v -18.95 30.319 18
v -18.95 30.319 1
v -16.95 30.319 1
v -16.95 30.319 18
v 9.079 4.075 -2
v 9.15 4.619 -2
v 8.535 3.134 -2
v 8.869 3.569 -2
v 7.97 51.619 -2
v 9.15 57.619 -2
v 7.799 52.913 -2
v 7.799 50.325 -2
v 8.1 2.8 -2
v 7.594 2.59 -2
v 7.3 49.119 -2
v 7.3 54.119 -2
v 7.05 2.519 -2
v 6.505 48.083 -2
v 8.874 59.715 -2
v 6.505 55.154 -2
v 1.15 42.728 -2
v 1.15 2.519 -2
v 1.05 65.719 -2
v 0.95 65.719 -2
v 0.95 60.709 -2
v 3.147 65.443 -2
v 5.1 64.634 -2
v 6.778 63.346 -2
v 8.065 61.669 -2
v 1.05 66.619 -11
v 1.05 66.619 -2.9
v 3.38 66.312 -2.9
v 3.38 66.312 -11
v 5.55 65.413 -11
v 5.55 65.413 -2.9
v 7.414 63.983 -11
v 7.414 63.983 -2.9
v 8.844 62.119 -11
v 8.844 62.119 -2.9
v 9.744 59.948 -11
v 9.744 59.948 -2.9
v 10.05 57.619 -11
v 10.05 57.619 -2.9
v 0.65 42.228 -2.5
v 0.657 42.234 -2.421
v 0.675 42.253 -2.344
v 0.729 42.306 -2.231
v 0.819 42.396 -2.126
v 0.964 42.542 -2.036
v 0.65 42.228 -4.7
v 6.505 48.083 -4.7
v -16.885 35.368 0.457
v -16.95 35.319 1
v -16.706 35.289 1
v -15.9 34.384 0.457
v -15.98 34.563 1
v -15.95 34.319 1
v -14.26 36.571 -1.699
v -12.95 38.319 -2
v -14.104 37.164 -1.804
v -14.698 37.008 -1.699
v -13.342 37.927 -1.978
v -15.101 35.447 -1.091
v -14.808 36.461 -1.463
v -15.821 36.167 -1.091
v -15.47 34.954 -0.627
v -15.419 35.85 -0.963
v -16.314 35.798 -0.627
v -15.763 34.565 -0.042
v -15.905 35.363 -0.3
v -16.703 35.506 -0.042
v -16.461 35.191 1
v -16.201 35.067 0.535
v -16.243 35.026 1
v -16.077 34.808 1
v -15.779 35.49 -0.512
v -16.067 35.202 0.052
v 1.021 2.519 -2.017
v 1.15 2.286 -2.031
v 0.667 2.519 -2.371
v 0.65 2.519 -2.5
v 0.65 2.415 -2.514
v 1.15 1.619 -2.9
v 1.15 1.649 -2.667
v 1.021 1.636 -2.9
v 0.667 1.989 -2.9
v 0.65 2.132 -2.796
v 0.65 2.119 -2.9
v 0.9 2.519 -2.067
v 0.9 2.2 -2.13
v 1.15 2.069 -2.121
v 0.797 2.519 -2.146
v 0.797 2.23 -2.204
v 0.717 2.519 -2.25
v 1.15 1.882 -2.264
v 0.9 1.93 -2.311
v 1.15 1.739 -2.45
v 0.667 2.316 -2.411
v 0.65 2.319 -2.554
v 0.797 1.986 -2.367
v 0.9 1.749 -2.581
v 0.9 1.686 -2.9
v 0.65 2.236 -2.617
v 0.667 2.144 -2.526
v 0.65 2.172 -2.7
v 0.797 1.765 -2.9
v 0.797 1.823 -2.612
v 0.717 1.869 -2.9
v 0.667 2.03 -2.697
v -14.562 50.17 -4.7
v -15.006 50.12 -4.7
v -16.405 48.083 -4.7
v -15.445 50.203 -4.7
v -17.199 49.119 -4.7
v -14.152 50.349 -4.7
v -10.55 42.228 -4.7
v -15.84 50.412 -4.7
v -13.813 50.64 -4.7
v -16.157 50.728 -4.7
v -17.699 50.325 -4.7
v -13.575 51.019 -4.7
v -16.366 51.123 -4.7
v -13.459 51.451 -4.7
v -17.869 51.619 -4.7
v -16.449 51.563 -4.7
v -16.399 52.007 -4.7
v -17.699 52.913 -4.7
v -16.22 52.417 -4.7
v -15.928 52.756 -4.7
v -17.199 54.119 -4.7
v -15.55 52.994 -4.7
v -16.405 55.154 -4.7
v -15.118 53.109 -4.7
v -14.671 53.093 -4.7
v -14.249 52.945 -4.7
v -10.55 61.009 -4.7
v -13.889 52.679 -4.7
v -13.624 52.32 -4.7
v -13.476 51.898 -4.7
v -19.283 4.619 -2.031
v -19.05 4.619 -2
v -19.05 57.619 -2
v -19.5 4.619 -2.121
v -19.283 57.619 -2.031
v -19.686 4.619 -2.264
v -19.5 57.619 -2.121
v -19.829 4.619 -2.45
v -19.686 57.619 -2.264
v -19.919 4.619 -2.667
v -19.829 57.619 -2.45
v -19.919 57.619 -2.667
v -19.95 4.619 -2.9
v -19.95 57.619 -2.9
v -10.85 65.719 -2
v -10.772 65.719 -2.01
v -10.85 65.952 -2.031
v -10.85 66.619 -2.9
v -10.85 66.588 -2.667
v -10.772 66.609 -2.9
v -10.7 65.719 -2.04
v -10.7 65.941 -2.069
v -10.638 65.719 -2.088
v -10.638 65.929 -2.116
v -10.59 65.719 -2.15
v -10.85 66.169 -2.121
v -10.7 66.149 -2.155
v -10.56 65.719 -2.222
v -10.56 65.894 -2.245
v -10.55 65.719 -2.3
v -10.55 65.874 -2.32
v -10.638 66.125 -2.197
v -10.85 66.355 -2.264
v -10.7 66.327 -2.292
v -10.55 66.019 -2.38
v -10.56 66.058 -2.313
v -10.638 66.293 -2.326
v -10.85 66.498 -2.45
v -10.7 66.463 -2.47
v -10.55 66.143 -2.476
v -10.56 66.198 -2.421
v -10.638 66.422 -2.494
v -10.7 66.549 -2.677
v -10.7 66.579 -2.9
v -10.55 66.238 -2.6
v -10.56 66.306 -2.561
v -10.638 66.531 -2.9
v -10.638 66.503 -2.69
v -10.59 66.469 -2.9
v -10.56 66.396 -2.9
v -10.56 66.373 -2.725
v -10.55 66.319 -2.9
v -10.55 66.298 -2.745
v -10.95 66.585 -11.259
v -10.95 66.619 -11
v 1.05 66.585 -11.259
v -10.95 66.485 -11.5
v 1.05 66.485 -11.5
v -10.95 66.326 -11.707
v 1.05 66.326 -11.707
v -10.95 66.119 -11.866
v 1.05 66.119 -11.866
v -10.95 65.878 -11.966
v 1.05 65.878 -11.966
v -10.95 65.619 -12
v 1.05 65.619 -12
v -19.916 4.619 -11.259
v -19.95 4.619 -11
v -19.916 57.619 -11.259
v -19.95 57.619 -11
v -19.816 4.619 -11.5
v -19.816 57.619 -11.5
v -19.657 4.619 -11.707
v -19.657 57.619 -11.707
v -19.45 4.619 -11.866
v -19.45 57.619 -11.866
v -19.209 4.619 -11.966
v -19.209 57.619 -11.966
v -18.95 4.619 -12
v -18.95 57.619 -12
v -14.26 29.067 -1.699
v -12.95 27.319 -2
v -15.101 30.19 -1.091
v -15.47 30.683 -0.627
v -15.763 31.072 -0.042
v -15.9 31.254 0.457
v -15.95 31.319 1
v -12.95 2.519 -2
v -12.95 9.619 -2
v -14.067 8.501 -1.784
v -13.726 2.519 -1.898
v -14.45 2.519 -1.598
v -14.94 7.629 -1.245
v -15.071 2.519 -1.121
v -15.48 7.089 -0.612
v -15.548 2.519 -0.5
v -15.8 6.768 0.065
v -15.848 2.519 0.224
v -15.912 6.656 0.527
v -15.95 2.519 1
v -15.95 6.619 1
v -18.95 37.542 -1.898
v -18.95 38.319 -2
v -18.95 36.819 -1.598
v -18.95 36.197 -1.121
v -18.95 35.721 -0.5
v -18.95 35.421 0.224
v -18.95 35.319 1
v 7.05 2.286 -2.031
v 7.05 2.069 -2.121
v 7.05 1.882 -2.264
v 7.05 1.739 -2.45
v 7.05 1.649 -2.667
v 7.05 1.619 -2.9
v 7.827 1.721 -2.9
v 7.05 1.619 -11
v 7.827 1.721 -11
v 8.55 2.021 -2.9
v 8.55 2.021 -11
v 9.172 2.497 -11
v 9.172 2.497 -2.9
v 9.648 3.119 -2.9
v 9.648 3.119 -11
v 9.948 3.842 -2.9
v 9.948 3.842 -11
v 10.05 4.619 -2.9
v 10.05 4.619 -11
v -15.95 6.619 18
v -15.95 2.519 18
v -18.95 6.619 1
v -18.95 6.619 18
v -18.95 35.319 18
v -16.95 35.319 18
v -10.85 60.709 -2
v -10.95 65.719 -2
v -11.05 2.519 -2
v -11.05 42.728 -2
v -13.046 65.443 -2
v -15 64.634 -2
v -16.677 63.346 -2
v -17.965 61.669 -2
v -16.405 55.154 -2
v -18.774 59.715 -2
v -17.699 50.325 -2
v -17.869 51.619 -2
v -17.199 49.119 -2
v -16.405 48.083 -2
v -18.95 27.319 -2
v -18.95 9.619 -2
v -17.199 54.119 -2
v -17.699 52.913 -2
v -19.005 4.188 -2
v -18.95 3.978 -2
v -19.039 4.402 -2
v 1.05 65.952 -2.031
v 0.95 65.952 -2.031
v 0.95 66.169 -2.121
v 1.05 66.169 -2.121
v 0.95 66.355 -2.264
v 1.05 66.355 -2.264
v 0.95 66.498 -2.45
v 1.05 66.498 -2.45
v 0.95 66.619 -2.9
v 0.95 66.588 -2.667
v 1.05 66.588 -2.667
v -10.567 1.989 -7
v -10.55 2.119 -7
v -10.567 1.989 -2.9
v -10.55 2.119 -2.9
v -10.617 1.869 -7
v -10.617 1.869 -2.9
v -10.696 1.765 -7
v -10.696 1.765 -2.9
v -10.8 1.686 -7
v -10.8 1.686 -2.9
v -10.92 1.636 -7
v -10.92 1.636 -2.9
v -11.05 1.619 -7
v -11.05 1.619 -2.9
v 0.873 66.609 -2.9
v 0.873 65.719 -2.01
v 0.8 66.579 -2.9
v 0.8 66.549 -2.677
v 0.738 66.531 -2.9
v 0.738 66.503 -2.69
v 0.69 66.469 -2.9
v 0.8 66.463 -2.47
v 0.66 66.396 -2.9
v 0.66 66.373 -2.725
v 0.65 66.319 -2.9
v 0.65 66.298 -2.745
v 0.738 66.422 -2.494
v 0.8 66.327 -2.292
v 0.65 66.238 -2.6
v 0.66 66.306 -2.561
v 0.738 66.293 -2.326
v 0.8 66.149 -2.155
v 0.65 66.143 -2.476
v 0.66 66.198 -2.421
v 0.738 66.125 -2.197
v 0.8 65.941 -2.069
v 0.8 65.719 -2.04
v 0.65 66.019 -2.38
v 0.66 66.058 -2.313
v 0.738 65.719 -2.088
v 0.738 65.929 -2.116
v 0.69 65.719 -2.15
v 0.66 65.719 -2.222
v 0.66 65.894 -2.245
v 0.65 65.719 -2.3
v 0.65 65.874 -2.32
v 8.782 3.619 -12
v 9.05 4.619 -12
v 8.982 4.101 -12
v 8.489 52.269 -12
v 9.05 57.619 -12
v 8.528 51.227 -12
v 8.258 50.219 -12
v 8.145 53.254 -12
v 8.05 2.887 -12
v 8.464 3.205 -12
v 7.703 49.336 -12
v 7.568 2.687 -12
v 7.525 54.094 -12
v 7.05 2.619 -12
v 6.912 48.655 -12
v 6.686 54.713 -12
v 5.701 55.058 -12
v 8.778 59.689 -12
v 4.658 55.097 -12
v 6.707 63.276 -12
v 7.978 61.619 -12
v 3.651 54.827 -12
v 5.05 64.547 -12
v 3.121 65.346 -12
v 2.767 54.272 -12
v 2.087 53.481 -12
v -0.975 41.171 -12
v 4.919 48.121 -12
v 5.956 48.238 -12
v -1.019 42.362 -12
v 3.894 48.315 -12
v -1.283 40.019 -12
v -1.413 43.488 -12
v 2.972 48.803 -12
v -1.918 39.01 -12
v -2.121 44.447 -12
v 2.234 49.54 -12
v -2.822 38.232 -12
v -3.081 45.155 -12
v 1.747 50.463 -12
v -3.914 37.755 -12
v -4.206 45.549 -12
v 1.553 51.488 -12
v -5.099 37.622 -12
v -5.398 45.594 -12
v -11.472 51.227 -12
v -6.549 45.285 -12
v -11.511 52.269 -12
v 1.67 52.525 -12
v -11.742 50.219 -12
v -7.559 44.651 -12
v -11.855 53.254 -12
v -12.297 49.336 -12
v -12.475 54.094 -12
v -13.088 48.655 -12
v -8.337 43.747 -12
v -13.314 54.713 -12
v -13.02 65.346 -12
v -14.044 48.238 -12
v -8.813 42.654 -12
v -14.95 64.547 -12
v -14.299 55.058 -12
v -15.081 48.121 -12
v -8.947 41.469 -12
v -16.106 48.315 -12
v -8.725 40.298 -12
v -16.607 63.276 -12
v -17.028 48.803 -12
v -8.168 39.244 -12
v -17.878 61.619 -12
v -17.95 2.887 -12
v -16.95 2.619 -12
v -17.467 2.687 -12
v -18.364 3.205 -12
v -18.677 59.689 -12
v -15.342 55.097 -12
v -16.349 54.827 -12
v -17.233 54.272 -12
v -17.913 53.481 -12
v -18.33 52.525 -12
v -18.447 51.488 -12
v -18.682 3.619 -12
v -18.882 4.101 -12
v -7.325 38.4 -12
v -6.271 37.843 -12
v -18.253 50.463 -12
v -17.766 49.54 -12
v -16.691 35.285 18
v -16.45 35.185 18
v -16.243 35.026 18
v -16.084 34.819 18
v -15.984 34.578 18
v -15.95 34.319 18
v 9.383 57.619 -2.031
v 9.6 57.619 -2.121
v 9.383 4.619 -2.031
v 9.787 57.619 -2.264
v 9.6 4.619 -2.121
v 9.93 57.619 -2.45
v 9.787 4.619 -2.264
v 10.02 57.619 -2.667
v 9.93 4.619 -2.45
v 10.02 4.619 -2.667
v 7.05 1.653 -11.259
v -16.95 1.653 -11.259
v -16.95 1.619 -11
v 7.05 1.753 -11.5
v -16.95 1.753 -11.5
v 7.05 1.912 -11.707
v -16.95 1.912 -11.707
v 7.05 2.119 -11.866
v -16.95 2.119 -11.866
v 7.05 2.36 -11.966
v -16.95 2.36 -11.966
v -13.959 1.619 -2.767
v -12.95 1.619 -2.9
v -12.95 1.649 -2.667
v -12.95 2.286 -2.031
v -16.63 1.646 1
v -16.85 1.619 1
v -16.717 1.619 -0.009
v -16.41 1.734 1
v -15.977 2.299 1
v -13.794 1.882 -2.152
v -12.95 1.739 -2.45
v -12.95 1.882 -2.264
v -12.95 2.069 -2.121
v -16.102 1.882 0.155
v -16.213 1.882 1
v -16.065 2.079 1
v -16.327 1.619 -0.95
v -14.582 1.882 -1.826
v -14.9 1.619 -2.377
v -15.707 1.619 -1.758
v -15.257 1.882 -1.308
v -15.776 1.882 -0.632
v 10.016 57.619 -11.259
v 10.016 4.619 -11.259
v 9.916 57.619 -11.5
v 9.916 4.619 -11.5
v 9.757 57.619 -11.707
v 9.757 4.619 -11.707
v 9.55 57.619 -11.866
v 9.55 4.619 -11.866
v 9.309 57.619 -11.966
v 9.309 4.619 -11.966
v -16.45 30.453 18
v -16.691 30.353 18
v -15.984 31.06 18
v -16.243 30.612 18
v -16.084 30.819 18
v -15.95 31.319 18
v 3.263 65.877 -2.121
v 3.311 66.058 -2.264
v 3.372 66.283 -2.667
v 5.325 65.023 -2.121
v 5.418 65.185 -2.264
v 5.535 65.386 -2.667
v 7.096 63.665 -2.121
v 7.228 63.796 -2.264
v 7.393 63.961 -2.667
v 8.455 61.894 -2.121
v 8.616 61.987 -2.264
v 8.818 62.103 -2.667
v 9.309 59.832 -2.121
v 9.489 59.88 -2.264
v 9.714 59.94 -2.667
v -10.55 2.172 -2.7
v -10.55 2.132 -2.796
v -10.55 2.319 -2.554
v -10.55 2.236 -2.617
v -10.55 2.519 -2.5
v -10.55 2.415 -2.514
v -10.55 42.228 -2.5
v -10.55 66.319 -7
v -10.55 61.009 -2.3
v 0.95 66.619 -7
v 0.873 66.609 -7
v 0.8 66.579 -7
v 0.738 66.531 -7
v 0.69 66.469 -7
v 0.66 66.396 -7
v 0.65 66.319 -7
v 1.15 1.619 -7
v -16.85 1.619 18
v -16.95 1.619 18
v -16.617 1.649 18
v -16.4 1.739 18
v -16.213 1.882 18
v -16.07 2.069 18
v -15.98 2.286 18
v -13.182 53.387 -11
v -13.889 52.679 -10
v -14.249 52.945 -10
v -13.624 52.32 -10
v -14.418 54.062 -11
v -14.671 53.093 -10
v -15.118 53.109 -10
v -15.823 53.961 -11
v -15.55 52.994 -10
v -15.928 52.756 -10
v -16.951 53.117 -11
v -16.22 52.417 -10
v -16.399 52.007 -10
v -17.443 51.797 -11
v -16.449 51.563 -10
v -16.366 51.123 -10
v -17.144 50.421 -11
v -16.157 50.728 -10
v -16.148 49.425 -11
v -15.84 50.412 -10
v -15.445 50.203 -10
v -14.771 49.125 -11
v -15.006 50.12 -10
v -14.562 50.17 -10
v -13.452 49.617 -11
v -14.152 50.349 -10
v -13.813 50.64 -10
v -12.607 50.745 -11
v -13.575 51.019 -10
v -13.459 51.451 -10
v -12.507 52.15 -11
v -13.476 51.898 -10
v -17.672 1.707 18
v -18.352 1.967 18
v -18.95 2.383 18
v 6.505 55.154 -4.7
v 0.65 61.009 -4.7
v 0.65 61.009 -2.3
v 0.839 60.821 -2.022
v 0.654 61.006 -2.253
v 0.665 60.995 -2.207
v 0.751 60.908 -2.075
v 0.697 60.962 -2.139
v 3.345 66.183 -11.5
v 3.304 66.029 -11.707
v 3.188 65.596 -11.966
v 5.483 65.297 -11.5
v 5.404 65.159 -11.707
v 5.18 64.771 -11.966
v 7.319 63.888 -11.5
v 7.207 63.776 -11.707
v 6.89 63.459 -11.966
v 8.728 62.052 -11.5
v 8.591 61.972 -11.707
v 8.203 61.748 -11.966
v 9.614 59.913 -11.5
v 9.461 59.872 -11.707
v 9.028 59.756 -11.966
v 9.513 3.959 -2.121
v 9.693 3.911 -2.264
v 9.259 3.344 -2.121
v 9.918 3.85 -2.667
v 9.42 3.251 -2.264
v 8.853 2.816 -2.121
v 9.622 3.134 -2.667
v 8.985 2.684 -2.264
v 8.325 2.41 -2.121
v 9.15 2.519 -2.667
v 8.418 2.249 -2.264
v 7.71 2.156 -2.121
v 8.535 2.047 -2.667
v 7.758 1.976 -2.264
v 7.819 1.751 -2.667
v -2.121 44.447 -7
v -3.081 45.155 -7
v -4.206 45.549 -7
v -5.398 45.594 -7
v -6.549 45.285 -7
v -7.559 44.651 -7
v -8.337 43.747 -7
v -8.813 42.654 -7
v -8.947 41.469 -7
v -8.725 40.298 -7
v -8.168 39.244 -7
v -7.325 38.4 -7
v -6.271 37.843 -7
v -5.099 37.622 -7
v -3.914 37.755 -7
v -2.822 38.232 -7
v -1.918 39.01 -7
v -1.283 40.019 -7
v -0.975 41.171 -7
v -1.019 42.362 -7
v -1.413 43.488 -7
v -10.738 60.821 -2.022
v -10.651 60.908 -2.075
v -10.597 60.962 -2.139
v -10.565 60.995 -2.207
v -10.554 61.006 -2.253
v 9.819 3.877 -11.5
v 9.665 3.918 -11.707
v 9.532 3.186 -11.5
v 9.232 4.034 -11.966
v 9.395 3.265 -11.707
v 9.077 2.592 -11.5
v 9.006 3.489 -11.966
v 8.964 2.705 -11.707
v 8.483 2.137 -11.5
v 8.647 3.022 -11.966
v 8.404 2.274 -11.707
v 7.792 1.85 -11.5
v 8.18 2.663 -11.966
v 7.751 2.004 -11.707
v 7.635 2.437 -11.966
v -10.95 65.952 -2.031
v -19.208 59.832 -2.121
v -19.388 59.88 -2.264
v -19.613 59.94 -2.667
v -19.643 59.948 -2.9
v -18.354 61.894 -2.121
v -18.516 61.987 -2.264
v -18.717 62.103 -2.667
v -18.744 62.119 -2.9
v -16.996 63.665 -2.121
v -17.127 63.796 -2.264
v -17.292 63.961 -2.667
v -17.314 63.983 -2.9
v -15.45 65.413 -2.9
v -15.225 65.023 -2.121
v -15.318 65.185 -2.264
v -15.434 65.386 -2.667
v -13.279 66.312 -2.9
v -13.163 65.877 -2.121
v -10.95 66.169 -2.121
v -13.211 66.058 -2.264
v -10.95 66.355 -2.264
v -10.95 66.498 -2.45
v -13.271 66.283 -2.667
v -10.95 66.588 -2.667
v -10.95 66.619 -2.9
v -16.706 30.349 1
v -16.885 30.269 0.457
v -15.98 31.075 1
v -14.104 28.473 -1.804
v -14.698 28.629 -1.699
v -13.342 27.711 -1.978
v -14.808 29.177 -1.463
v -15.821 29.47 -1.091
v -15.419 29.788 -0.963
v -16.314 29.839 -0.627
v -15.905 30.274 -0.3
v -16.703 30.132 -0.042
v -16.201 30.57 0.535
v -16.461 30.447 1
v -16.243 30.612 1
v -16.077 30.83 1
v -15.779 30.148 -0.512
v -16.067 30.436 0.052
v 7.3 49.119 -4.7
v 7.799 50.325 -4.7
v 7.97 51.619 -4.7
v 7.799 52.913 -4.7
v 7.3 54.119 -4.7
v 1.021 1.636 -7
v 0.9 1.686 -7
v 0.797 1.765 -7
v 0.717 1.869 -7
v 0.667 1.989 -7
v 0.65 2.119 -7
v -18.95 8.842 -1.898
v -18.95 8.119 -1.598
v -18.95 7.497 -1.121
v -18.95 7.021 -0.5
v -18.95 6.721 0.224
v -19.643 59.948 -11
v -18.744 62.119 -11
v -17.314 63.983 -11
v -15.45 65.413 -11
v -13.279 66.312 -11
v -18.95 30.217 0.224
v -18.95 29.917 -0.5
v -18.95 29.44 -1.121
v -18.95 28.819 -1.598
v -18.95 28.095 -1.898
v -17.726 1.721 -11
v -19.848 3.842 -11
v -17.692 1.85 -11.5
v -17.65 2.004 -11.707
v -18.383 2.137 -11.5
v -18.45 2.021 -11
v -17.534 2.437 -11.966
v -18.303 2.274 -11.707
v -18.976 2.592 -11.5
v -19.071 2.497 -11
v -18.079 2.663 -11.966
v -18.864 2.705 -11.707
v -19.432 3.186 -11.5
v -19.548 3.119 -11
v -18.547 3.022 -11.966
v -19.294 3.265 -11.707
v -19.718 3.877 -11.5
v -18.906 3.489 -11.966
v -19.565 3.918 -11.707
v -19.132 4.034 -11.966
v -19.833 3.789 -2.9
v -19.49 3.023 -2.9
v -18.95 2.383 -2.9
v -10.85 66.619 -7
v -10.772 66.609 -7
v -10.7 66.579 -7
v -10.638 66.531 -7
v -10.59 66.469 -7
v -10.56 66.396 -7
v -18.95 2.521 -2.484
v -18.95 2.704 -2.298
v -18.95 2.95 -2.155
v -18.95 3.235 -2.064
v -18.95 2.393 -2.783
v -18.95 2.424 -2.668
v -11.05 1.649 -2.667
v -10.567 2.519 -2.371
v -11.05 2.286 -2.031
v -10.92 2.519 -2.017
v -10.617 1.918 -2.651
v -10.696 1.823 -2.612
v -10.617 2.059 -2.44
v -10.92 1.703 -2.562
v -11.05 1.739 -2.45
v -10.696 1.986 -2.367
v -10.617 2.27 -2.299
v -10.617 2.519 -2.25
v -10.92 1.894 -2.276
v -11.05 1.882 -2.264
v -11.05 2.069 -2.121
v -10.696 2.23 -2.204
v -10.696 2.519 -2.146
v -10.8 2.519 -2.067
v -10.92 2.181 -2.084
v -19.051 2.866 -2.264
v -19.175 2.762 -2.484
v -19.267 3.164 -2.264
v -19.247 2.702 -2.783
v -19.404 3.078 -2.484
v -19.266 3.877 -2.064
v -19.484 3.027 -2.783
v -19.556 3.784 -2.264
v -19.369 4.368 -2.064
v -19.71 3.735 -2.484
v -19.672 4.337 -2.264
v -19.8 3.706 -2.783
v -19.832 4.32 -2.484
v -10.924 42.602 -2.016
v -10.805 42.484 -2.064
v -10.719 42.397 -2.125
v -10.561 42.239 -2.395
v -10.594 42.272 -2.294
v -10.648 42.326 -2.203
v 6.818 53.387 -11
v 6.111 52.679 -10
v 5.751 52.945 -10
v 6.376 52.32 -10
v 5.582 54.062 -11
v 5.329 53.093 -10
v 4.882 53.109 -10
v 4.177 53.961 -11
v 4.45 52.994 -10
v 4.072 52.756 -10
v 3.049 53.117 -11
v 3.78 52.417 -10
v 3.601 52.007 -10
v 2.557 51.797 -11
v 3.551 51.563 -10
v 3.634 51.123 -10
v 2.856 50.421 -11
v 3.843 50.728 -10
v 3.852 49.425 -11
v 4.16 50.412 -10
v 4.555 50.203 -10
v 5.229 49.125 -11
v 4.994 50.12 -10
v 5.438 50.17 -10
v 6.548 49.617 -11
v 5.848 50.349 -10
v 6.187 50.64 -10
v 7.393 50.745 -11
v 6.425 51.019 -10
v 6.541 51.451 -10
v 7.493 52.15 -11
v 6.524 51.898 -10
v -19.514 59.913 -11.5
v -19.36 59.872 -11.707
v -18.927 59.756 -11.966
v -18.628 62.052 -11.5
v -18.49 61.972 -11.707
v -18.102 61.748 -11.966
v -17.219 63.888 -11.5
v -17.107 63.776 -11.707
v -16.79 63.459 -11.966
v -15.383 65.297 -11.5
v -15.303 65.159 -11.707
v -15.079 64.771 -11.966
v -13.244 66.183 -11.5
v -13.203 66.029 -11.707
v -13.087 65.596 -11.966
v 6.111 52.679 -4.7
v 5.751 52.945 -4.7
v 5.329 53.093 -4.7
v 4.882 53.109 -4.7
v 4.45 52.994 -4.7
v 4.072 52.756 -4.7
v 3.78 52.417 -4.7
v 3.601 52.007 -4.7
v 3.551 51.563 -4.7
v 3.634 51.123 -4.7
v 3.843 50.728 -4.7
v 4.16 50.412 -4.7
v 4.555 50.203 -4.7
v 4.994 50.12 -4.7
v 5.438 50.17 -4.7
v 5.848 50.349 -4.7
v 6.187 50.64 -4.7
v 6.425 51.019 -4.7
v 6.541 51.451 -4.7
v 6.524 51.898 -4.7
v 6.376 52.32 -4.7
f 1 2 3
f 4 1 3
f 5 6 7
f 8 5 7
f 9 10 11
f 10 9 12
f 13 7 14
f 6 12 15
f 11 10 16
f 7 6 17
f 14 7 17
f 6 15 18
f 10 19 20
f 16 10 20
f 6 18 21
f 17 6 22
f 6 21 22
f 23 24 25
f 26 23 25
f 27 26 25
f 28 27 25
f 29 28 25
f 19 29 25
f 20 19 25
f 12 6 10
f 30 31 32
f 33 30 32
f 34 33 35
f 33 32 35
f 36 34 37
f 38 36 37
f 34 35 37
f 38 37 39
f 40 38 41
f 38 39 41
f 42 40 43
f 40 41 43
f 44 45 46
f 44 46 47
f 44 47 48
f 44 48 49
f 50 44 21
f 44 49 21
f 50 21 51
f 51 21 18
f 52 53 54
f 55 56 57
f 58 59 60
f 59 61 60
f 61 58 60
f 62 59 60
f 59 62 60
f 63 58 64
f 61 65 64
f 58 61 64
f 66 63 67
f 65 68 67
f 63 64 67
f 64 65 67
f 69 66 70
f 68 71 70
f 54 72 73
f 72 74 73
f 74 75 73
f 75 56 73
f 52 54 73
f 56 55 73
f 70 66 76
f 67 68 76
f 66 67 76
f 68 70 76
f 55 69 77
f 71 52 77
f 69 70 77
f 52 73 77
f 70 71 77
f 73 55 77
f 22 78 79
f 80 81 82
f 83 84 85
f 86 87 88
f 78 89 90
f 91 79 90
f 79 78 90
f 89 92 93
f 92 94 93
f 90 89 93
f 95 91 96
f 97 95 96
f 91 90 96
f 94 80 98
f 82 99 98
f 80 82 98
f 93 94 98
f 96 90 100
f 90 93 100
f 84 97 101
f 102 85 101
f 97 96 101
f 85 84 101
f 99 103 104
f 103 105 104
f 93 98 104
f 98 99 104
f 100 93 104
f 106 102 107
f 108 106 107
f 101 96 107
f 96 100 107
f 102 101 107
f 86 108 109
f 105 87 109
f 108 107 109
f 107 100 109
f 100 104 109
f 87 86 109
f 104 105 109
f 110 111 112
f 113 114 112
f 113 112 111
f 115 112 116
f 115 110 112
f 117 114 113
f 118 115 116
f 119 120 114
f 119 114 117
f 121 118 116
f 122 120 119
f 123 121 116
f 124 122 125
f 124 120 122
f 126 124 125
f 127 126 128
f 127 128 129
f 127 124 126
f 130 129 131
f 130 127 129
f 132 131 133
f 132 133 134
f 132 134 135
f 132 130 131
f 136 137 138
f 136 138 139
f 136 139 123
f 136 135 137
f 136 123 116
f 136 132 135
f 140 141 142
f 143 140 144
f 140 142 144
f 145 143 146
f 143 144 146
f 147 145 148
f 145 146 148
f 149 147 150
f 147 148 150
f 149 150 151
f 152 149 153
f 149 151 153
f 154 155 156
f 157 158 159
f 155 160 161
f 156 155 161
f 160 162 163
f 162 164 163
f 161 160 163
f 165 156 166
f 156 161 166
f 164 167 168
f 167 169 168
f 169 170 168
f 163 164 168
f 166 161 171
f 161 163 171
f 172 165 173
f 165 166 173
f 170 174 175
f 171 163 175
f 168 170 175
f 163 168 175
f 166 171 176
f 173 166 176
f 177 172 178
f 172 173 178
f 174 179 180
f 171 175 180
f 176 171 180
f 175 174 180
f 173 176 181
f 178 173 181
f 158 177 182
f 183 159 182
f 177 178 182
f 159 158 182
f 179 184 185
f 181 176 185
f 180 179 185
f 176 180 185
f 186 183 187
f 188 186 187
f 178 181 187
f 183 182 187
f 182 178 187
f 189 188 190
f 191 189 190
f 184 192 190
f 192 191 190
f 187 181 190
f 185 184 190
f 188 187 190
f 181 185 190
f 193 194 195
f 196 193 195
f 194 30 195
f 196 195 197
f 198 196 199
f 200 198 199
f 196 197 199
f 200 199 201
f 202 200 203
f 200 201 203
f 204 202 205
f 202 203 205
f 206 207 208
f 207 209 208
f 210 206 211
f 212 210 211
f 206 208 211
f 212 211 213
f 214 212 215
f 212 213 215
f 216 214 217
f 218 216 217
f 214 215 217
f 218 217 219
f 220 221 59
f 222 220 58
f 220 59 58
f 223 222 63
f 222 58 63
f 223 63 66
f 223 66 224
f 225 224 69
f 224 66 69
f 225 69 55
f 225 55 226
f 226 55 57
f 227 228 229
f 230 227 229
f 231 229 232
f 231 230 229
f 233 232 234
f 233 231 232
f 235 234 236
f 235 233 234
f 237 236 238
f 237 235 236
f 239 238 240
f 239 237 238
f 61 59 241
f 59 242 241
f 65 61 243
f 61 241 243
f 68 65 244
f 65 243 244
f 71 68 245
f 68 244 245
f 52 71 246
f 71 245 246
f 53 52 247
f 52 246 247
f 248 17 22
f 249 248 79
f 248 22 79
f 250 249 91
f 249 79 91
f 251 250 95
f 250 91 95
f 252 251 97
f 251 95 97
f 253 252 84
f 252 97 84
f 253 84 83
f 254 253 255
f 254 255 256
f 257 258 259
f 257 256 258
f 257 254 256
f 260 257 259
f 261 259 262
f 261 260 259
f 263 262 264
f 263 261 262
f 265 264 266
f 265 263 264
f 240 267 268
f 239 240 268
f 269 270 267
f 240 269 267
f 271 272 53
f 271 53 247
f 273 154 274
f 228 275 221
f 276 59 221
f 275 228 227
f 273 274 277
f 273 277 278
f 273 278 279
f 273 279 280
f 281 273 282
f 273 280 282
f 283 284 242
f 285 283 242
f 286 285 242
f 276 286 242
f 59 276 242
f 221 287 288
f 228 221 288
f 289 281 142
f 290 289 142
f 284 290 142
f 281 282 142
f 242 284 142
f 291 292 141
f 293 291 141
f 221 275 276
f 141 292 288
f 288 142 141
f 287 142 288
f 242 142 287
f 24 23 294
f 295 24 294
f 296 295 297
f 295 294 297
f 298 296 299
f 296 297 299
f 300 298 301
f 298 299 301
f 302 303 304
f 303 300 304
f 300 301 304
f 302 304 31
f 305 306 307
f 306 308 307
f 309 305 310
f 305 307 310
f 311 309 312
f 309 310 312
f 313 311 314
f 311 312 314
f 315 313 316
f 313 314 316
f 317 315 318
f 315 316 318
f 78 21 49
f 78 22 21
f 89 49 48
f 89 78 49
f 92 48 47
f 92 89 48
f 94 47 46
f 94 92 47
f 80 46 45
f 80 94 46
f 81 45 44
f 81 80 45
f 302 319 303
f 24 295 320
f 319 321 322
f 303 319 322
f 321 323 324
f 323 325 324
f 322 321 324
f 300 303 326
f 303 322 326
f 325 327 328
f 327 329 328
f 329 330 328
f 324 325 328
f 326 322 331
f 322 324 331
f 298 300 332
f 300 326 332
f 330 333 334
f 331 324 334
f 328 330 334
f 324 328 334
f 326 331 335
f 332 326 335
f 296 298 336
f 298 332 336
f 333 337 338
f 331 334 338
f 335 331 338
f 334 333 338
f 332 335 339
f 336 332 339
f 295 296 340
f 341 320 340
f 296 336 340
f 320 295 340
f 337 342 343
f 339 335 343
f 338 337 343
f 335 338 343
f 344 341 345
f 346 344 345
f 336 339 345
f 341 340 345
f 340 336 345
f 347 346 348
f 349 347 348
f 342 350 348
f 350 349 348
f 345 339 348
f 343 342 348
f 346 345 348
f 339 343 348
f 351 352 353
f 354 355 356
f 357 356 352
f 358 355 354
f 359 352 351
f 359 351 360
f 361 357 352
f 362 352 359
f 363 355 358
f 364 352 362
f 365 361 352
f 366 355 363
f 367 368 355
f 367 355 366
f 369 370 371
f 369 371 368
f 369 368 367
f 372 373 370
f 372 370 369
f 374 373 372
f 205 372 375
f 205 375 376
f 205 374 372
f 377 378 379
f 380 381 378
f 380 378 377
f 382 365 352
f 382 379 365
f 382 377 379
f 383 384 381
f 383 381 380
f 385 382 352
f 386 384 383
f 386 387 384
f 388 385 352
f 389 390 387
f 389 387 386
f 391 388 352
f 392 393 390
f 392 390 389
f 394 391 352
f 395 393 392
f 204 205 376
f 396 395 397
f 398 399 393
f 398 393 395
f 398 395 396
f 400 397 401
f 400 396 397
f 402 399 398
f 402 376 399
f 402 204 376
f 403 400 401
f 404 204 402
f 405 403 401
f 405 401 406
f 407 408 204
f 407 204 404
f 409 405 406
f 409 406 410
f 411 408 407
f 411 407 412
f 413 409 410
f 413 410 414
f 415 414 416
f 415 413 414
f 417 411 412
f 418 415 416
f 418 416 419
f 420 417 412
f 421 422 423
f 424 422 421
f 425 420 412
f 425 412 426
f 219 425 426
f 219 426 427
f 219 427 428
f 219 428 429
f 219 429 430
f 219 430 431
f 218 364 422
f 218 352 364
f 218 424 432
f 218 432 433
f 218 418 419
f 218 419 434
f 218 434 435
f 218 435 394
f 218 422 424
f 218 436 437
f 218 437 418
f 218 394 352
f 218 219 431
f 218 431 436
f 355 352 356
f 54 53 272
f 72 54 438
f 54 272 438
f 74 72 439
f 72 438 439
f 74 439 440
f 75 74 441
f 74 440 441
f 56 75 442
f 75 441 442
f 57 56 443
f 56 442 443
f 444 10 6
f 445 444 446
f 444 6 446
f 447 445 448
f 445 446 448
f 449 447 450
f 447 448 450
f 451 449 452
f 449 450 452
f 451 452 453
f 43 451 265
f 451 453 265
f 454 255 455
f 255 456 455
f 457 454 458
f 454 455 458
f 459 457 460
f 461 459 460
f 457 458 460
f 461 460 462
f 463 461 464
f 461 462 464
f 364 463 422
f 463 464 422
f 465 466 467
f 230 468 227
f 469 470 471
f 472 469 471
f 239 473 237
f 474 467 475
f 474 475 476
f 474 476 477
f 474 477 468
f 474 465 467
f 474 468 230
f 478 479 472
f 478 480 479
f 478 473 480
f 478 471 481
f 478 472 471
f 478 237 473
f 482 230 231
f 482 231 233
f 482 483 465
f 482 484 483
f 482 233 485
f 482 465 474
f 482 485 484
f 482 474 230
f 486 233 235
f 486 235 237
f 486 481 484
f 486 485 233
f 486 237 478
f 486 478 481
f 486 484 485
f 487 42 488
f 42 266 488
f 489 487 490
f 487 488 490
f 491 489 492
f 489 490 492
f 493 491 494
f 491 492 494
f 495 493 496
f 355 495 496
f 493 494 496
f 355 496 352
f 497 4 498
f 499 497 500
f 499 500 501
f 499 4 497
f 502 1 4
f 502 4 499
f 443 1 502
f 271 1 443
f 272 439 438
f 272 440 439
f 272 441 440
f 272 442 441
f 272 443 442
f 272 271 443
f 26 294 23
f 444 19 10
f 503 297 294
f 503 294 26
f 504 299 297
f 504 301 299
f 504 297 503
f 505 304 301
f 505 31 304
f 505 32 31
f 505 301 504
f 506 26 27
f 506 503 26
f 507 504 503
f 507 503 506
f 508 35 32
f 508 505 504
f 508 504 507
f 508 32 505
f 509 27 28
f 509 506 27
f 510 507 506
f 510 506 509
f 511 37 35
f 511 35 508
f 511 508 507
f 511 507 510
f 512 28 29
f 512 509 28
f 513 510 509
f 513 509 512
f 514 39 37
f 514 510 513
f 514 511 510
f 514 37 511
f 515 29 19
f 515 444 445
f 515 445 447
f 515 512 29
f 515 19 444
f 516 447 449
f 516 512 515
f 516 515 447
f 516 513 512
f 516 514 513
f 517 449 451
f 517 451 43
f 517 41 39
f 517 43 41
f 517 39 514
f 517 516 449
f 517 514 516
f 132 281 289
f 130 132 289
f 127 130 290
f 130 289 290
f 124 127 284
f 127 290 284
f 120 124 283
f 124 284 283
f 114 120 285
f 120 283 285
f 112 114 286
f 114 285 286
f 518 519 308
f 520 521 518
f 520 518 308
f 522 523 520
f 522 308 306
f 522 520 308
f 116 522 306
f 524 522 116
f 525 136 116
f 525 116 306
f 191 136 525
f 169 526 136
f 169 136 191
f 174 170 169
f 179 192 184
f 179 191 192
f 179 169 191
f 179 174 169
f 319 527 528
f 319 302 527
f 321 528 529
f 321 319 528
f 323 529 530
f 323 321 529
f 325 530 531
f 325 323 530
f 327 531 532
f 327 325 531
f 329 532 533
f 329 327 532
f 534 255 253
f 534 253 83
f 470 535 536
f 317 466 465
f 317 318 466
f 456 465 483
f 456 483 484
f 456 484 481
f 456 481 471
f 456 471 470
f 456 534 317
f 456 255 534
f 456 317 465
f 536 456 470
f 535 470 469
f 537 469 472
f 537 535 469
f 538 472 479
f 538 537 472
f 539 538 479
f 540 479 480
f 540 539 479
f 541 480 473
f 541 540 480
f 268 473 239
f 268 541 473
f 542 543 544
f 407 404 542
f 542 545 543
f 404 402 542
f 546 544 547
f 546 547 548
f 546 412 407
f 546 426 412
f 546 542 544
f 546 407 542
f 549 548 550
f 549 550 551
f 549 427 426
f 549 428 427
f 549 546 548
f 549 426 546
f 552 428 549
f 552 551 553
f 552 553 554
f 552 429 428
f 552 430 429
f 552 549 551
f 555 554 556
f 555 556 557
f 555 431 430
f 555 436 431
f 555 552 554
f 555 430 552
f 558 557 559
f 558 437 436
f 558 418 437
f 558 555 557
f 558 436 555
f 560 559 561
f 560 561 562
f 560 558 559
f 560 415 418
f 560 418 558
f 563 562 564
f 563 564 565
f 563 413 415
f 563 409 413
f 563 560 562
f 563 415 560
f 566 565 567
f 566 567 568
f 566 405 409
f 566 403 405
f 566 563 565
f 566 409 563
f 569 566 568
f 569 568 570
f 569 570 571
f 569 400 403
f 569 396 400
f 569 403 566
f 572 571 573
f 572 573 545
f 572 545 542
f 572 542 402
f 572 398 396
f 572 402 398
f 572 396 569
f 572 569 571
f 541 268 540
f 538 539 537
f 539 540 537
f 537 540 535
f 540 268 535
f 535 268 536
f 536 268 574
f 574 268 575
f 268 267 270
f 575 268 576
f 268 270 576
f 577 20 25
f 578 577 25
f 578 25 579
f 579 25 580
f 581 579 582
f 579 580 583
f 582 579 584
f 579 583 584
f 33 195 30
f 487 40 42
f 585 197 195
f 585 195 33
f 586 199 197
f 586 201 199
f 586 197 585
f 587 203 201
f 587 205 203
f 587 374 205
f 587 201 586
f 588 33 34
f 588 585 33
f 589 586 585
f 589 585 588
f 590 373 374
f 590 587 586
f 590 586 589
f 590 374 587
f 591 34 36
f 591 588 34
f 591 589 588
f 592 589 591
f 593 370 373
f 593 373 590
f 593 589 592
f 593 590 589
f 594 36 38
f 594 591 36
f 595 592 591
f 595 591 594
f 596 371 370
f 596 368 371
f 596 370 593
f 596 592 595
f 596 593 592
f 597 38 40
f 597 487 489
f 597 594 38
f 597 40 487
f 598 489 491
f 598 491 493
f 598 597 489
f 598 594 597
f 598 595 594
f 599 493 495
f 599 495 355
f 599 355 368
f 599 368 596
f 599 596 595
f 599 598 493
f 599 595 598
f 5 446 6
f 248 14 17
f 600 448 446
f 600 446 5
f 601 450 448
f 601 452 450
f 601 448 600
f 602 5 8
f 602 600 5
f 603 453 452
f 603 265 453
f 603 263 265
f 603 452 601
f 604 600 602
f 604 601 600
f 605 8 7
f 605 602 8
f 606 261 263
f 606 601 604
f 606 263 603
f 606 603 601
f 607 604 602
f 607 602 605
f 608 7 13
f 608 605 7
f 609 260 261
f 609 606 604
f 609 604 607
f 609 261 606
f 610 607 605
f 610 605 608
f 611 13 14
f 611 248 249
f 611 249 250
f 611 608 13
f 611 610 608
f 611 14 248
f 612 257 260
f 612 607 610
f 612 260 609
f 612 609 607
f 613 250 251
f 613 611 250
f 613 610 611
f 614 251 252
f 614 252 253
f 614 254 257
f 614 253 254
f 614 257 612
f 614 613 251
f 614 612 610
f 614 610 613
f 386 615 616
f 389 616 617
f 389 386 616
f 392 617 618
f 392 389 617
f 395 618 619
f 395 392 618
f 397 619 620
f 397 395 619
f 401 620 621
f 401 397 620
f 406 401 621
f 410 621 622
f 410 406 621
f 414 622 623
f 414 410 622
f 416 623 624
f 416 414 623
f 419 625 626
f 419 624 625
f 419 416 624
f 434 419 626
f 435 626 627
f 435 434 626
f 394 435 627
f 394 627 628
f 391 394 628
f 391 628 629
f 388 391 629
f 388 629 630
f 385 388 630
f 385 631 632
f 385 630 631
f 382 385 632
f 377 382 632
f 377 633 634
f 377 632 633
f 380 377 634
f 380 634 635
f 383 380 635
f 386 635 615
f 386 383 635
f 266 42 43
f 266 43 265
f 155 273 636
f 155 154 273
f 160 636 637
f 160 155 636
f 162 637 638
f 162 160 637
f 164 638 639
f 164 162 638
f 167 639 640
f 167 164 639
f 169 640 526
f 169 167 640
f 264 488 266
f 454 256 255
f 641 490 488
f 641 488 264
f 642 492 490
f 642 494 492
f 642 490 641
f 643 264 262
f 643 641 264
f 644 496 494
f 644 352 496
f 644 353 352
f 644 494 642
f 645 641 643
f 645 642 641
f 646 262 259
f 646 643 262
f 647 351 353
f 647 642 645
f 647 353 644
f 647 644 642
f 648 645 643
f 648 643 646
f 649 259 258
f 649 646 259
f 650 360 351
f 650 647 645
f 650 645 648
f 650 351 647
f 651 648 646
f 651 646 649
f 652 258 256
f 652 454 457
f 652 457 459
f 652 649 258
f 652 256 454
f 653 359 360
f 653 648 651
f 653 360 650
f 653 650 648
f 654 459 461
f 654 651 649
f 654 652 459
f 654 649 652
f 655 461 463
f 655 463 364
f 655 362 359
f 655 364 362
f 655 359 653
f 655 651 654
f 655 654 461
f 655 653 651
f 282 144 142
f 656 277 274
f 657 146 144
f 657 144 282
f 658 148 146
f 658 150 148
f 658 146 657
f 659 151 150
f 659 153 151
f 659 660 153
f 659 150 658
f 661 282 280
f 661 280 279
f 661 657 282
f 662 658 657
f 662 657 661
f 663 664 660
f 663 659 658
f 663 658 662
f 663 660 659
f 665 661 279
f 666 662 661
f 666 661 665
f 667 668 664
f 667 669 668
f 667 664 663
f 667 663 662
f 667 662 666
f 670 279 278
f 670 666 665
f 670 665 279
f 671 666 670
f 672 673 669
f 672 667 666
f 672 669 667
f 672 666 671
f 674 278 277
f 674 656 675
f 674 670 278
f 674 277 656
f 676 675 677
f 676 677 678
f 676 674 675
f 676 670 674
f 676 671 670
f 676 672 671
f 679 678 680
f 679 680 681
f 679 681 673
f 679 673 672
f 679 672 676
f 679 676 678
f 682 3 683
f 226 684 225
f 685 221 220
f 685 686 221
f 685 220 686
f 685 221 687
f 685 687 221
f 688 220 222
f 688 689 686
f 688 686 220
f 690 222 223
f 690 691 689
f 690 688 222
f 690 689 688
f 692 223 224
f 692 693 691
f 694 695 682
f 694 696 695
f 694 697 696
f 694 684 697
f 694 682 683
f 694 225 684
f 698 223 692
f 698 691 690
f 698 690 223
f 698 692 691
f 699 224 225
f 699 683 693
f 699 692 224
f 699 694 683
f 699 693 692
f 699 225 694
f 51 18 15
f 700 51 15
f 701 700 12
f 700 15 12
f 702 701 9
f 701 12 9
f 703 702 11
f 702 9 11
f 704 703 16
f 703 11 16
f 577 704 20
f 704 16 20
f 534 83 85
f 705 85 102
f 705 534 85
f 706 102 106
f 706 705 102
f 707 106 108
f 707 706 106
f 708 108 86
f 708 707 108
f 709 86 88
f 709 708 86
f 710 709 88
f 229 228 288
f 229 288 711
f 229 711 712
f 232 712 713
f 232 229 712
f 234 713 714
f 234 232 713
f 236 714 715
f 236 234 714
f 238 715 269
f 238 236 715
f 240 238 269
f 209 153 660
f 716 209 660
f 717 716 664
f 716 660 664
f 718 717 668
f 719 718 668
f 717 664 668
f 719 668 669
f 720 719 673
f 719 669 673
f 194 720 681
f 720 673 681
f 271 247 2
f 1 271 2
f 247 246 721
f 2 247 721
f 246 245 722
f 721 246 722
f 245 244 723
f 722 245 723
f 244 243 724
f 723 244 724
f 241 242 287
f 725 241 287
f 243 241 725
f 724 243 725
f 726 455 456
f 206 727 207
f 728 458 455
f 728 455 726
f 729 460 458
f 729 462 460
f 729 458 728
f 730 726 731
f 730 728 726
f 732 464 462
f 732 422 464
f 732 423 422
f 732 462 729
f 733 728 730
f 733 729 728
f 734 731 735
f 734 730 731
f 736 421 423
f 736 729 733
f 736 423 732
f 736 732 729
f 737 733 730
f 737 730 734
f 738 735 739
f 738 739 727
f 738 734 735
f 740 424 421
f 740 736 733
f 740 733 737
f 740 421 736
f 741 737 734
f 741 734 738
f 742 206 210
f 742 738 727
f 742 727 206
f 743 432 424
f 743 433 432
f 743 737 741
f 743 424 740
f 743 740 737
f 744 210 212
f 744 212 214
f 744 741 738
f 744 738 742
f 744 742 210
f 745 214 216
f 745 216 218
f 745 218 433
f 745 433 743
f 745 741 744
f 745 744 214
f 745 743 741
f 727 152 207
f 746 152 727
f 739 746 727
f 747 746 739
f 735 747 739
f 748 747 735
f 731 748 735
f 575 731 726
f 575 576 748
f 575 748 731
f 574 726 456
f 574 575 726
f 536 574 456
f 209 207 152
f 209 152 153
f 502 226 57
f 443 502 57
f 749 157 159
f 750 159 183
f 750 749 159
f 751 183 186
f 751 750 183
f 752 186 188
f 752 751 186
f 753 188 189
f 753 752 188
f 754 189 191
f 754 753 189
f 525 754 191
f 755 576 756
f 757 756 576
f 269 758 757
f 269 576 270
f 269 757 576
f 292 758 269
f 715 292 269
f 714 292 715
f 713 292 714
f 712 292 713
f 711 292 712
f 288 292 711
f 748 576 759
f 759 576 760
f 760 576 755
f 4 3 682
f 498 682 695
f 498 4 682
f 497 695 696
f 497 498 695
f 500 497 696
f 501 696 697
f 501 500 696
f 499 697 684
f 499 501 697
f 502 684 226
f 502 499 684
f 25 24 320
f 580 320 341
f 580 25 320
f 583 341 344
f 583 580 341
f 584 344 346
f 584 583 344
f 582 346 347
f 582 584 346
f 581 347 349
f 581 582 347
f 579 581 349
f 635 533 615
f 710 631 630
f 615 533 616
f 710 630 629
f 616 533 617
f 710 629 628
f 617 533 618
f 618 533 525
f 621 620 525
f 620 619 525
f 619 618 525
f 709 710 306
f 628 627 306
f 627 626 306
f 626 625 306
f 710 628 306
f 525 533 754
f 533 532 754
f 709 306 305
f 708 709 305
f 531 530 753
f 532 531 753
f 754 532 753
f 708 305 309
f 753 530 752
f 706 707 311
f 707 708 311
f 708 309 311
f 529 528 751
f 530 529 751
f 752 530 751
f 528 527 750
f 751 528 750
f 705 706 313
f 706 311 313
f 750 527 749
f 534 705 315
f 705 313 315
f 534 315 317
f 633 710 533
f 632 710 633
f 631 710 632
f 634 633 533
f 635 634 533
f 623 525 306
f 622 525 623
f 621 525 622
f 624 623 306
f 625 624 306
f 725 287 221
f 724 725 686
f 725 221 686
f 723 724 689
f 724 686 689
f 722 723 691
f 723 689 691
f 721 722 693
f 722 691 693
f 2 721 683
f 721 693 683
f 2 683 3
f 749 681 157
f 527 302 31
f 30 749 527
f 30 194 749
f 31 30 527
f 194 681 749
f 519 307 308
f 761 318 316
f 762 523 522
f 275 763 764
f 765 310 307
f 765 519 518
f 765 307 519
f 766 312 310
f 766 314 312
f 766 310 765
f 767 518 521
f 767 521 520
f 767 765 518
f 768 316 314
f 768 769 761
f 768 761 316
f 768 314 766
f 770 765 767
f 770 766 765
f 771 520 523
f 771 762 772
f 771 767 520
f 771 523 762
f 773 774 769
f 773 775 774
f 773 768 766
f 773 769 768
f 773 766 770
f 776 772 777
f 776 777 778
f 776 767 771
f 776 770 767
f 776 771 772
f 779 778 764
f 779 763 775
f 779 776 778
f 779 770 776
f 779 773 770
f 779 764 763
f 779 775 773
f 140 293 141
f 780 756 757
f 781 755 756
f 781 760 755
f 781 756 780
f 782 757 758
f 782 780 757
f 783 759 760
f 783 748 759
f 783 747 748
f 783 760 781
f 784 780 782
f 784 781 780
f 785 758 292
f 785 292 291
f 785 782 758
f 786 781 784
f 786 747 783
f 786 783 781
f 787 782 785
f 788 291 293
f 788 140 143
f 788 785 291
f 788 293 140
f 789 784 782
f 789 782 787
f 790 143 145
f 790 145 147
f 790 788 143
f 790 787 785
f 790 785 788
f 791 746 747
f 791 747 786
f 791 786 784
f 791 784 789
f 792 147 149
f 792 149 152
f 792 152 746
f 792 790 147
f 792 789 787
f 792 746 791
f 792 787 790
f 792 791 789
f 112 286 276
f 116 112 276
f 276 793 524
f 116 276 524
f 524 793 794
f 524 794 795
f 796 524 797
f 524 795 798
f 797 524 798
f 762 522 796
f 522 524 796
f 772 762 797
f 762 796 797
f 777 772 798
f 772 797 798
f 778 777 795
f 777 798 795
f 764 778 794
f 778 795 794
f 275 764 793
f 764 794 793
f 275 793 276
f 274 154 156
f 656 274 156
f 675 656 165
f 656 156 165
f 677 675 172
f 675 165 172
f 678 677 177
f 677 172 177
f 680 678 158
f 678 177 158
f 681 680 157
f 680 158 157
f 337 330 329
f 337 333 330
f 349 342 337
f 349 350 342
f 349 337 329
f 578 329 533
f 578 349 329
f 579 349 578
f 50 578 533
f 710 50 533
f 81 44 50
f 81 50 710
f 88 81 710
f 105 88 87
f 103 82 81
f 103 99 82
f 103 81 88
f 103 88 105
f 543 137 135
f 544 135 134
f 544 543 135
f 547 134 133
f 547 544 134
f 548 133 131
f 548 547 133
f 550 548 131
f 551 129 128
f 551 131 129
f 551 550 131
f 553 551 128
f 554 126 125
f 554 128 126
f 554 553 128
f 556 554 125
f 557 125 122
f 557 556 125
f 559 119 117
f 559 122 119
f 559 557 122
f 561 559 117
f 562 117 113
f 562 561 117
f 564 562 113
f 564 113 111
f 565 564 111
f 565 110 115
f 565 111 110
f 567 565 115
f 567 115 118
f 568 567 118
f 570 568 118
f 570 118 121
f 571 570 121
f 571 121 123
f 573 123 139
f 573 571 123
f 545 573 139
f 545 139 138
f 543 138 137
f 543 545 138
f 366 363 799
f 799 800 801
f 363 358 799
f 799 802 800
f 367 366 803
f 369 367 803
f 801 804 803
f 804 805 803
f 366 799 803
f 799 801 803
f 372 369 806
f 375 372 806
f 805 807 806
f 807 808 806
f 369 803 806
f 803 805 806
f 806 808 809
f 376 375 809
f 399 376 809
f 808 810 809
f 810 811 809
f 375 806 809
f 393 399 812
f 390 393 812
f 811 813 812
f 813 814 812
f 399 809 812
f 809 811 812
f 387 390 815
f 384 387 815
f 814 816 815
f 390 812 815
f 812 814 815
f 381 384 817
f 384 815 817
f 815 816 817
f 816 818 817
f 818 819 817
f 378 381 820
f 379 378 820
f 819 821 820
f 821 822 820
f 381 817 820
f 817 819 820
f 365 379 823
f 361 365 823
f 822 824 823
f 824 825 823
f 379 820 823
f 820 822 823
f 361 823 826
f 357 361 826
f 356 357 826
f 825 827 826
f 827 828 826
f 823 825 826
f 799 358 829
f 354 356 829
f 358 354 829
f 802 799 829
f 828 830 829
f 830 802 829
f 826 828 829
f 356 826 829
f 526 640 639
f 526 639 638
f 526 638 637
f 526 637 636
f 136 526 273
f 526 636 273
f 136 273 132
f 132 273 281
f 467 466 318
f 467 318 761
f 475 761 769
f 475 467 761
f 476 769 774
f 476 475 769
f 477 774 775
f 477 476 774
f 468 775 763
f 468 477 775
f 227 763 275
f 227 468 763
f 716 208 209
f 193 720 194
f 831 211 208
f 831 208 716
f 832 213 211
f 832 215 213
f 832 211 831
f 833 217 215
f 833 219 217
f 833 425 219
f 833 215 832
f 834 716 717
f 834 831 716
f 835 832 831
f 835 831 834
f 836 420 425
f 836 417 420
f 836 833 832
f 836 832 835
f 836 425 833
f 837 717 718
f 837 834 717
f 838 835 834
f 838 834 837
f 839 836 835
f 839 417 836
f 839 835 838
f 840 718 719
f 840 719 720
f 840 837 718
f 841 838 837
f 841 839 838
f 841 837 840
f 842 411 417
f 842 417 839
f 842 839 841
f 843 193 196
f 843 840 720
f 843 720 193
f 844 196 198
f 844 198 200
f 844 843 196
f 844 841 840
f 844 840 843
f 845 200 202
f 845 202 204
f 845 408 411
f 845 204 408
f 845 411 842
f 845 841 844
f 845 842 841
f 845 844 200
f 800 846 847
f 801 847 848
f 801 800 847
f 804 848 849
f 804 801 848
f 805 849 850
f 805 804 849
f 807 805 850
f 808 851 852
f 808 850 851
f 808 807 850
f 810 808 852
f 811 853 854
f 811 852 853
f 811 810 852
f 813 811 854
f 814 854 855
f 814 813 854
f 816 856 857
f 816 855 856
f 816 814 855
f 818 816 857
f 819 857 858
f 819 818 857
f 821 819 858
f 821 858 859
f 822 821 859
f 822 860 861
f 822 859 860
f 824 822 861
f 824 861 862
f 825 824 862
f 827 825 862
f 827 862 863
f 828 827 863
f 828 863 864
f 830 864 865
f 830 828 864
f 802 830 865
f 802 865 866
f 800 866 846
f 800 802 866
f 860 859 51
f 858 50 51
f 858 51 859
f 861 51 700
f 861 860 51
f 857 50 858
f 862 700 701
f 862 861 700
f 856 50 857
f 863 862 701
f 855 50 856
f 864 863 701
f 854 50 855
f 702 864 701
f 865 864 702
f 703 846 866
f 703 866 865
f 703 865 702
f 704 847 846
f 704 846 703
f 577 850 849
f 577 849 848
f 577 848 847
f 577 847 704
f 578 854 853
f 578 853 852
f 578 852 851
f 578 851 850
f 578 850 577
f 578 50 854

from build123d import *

# Parameters (mm, degrees)
SKETCH010_R             = 4
SKETCH010_R_2           = 1.5
PAD_DEPTH               = 10
POCKET003_DEPTH         = 5
POCKET004_DEPTH         = 2.7
PAD010_DEPTH            = 20
FILLET001_R             = 9
FILLET002_R             = 3
FILLET003_R             = 3
FILLET004_R             = 0.9
CHAMFER_SIZE            = 2
FILLET005_R             = 0.9
FILLET006_R             = 1
FILLET007_R             = 0.5
FILLET008_R             = 0.3
FILLET009_R             = 1
BODY001_PLACEMENT_ANGLE = 45


with BuildPart() as part:
    # Sketch010 → Pad (new body)
    with BuildSketch(Plane.XY):
        Polygon((-45.961941, -24.748737), (0, 21.213203), (21.213203, 0), (-24.748737, -45.961941), align=None)
        with Locations((-7.071068, -7.071068)):
            Circle(SKETCH010_R, mode=Mode.SUBTRACT)
        with Locations((-7.071068, 7.071068)):
            Circle(SKETCH010_R_2, mode=Mode.SUBTRACT)
        with Locations((7.071068, -7.071068)):
            Circle(SKETCH010_R_2, mode=Mode.SUBTRACT)
    extrude(amount=PAD_DEPTH)

    # Sketch011 → Pocket003 (cut)
    with BuildSketch(Plane.XY.offset(10)):
        Polygon((-47.335856, -39.41626), (26.386553, 34.306149), (34.306149, 26.386553), (-39.41626, -47.335856), align=None)
    extrude(amount=-POCKET003_DEPTH, mode=Mode.SUBTRACT)

    # Sketch017 → Pocket004 (cut)
    with BuildSketch(Plane.XY.offset(10)):
        with BuildLine():
            ThreePointArc((-5.6, 10.6), (-9.135534, 9.135534), (-10.6, 5.6))
            Line((-10.6, 5.6), (-10.6, -5.6))
            ThreePointArc((-10.6, -5.6), (-9.135534, -9.135534), (-5.6, -10.6))
            Line((-5.6, -10.6), (5.6, -10.6))
            ThreePointArc((5.6, -10.6), (9.135534, -9.135534), (10.6, -5.6))
            Line((10.6, -5.6), (10.6, 5.6))
            ThreePointArc((10.6, 5.6), (9.135534, 9.135534), (5.6, 10.6))
            Line((5.6, 10.6), (-5.6, 10.6))
        make_face()
    extrude(amount=-POCKET004_DEPTH, mode=Mode.SUBTRACT)

    # Sketch023 → Pad010 (join)
    with BuildSketch(Plane.XY.offset(10)):
        Polygon((-41.7193, -21.92031), (-39.59798, -24.041631), (-43.133514, -27.577164), (-45.254834, -25.455844), align=None)
        Polygon((-24.960869, -5.16188), (-22.839549, -7.2832), (-19.304015, -3.747666), (-21.425335, -1.626346), align=None)
    extrude(amount=PAD010_DEPTH)

    # Fillet001
    fillet001_edges = [part.edges().sort_by_distance(p)[0] for p in [
        (0, 21.213203, 5),
        (21.213203, 0, 5),
    ]]
    fillet(fillet001_edges, radius=FILLET001_R)

    # Fillet002
    fillet002_edges = [part.edges().sort_by_distance(p)[0] for p in [
        (-45.961941, -24.748737, 5),
        (-24.748737, -45.961941, 5),
    ]]
    fillet(fillet002_edges, radius=FILLET002_R)

    # Fillet003
    fillet003_edges = [part.edges().sort_by_distance(p)[0] for p in [
        (-41.365747, -25.809398, 10),
        (-21.071782, -5.515433, 10),
        (-40.65864, -22.98097, 10),
        (-20.364675, -2.687006, 10),
        (-23.900209, -6.22254, 10),
    ]]
    fillet(fillet003_edges, radius=FILLET003_R)

    # Fillet004
    fillet004_edges = [part.edges().sort_by_distance(p)[0] for p in [
        (-25.102291, -3.889087, 10),
        (-3.889087, -25.102291, 10),
    ]]
    fillet(fillet004_edges, radius=FILLET004_R)

    # Chamfer
    chamfer_edges = [part.edges().sort_by_distance(p)[0] for p in [
        (5.571068, -7.071068, 0),
        (-8.571068, 7.071068, 0),
    ]]
    chamfer(chamfer_edges, length=CHAMFER_SIZE)

    # Fillet005
    fillet005_edges = [part.edges().sort_by_distance(p)[0] for p in [
        (-40.163665, -30.547013, 10),
    ]]
    fillet(fillet005_edges, radius=FILLET005_R)

    # Fillet006
    fillet006_edges = [part.edges().sort_by_distance(p)[0] for p in [
        (-22.839549, -7.2832, 21.5),
        (-19.304015, -3.747666, 21.5),
    ]]
    fillet(fillet006_edges, radius=FILLET006_R)

    # Fillet007
    fillet007_edges = [part.edges().sort_by_distance(p)[0] for p in [
        (-39.315137, -31.395541, 7.05),
        (-31.395541, -39.315137, 7.05),
    ]]
    fillet(fillet007_edges, radius=FILLET007_R)

    # Fillet008
    fillet008_edges = [part.edges().sort_by_distance(p)[0] for p in [
        (6.646804, 14.5664, 7.05),
        (14.5664, 6.646804, 7.05),
    ]]
    fillet(fillet008_edges, radius=FILLET008_R)

    # Fillet009
    fillet009_edges = [part.edges().sort_by_distance(p)[0] for p in [
        (-25.102291, -3.889087, 0),
    ]]
    fillet(fillet009_edges, radius=FILLET009_R)


with BuildPart() as part_1:
    # Body001 placement: moved
    add(part.part.moved(Location((-4.949747, 51.618795, -12))).rotate(Axis((-4.949747, 51.618795, -12), (0, 0, 1)), BODY001_PLACEMENT_ANGLE))


solid = part_1.part
